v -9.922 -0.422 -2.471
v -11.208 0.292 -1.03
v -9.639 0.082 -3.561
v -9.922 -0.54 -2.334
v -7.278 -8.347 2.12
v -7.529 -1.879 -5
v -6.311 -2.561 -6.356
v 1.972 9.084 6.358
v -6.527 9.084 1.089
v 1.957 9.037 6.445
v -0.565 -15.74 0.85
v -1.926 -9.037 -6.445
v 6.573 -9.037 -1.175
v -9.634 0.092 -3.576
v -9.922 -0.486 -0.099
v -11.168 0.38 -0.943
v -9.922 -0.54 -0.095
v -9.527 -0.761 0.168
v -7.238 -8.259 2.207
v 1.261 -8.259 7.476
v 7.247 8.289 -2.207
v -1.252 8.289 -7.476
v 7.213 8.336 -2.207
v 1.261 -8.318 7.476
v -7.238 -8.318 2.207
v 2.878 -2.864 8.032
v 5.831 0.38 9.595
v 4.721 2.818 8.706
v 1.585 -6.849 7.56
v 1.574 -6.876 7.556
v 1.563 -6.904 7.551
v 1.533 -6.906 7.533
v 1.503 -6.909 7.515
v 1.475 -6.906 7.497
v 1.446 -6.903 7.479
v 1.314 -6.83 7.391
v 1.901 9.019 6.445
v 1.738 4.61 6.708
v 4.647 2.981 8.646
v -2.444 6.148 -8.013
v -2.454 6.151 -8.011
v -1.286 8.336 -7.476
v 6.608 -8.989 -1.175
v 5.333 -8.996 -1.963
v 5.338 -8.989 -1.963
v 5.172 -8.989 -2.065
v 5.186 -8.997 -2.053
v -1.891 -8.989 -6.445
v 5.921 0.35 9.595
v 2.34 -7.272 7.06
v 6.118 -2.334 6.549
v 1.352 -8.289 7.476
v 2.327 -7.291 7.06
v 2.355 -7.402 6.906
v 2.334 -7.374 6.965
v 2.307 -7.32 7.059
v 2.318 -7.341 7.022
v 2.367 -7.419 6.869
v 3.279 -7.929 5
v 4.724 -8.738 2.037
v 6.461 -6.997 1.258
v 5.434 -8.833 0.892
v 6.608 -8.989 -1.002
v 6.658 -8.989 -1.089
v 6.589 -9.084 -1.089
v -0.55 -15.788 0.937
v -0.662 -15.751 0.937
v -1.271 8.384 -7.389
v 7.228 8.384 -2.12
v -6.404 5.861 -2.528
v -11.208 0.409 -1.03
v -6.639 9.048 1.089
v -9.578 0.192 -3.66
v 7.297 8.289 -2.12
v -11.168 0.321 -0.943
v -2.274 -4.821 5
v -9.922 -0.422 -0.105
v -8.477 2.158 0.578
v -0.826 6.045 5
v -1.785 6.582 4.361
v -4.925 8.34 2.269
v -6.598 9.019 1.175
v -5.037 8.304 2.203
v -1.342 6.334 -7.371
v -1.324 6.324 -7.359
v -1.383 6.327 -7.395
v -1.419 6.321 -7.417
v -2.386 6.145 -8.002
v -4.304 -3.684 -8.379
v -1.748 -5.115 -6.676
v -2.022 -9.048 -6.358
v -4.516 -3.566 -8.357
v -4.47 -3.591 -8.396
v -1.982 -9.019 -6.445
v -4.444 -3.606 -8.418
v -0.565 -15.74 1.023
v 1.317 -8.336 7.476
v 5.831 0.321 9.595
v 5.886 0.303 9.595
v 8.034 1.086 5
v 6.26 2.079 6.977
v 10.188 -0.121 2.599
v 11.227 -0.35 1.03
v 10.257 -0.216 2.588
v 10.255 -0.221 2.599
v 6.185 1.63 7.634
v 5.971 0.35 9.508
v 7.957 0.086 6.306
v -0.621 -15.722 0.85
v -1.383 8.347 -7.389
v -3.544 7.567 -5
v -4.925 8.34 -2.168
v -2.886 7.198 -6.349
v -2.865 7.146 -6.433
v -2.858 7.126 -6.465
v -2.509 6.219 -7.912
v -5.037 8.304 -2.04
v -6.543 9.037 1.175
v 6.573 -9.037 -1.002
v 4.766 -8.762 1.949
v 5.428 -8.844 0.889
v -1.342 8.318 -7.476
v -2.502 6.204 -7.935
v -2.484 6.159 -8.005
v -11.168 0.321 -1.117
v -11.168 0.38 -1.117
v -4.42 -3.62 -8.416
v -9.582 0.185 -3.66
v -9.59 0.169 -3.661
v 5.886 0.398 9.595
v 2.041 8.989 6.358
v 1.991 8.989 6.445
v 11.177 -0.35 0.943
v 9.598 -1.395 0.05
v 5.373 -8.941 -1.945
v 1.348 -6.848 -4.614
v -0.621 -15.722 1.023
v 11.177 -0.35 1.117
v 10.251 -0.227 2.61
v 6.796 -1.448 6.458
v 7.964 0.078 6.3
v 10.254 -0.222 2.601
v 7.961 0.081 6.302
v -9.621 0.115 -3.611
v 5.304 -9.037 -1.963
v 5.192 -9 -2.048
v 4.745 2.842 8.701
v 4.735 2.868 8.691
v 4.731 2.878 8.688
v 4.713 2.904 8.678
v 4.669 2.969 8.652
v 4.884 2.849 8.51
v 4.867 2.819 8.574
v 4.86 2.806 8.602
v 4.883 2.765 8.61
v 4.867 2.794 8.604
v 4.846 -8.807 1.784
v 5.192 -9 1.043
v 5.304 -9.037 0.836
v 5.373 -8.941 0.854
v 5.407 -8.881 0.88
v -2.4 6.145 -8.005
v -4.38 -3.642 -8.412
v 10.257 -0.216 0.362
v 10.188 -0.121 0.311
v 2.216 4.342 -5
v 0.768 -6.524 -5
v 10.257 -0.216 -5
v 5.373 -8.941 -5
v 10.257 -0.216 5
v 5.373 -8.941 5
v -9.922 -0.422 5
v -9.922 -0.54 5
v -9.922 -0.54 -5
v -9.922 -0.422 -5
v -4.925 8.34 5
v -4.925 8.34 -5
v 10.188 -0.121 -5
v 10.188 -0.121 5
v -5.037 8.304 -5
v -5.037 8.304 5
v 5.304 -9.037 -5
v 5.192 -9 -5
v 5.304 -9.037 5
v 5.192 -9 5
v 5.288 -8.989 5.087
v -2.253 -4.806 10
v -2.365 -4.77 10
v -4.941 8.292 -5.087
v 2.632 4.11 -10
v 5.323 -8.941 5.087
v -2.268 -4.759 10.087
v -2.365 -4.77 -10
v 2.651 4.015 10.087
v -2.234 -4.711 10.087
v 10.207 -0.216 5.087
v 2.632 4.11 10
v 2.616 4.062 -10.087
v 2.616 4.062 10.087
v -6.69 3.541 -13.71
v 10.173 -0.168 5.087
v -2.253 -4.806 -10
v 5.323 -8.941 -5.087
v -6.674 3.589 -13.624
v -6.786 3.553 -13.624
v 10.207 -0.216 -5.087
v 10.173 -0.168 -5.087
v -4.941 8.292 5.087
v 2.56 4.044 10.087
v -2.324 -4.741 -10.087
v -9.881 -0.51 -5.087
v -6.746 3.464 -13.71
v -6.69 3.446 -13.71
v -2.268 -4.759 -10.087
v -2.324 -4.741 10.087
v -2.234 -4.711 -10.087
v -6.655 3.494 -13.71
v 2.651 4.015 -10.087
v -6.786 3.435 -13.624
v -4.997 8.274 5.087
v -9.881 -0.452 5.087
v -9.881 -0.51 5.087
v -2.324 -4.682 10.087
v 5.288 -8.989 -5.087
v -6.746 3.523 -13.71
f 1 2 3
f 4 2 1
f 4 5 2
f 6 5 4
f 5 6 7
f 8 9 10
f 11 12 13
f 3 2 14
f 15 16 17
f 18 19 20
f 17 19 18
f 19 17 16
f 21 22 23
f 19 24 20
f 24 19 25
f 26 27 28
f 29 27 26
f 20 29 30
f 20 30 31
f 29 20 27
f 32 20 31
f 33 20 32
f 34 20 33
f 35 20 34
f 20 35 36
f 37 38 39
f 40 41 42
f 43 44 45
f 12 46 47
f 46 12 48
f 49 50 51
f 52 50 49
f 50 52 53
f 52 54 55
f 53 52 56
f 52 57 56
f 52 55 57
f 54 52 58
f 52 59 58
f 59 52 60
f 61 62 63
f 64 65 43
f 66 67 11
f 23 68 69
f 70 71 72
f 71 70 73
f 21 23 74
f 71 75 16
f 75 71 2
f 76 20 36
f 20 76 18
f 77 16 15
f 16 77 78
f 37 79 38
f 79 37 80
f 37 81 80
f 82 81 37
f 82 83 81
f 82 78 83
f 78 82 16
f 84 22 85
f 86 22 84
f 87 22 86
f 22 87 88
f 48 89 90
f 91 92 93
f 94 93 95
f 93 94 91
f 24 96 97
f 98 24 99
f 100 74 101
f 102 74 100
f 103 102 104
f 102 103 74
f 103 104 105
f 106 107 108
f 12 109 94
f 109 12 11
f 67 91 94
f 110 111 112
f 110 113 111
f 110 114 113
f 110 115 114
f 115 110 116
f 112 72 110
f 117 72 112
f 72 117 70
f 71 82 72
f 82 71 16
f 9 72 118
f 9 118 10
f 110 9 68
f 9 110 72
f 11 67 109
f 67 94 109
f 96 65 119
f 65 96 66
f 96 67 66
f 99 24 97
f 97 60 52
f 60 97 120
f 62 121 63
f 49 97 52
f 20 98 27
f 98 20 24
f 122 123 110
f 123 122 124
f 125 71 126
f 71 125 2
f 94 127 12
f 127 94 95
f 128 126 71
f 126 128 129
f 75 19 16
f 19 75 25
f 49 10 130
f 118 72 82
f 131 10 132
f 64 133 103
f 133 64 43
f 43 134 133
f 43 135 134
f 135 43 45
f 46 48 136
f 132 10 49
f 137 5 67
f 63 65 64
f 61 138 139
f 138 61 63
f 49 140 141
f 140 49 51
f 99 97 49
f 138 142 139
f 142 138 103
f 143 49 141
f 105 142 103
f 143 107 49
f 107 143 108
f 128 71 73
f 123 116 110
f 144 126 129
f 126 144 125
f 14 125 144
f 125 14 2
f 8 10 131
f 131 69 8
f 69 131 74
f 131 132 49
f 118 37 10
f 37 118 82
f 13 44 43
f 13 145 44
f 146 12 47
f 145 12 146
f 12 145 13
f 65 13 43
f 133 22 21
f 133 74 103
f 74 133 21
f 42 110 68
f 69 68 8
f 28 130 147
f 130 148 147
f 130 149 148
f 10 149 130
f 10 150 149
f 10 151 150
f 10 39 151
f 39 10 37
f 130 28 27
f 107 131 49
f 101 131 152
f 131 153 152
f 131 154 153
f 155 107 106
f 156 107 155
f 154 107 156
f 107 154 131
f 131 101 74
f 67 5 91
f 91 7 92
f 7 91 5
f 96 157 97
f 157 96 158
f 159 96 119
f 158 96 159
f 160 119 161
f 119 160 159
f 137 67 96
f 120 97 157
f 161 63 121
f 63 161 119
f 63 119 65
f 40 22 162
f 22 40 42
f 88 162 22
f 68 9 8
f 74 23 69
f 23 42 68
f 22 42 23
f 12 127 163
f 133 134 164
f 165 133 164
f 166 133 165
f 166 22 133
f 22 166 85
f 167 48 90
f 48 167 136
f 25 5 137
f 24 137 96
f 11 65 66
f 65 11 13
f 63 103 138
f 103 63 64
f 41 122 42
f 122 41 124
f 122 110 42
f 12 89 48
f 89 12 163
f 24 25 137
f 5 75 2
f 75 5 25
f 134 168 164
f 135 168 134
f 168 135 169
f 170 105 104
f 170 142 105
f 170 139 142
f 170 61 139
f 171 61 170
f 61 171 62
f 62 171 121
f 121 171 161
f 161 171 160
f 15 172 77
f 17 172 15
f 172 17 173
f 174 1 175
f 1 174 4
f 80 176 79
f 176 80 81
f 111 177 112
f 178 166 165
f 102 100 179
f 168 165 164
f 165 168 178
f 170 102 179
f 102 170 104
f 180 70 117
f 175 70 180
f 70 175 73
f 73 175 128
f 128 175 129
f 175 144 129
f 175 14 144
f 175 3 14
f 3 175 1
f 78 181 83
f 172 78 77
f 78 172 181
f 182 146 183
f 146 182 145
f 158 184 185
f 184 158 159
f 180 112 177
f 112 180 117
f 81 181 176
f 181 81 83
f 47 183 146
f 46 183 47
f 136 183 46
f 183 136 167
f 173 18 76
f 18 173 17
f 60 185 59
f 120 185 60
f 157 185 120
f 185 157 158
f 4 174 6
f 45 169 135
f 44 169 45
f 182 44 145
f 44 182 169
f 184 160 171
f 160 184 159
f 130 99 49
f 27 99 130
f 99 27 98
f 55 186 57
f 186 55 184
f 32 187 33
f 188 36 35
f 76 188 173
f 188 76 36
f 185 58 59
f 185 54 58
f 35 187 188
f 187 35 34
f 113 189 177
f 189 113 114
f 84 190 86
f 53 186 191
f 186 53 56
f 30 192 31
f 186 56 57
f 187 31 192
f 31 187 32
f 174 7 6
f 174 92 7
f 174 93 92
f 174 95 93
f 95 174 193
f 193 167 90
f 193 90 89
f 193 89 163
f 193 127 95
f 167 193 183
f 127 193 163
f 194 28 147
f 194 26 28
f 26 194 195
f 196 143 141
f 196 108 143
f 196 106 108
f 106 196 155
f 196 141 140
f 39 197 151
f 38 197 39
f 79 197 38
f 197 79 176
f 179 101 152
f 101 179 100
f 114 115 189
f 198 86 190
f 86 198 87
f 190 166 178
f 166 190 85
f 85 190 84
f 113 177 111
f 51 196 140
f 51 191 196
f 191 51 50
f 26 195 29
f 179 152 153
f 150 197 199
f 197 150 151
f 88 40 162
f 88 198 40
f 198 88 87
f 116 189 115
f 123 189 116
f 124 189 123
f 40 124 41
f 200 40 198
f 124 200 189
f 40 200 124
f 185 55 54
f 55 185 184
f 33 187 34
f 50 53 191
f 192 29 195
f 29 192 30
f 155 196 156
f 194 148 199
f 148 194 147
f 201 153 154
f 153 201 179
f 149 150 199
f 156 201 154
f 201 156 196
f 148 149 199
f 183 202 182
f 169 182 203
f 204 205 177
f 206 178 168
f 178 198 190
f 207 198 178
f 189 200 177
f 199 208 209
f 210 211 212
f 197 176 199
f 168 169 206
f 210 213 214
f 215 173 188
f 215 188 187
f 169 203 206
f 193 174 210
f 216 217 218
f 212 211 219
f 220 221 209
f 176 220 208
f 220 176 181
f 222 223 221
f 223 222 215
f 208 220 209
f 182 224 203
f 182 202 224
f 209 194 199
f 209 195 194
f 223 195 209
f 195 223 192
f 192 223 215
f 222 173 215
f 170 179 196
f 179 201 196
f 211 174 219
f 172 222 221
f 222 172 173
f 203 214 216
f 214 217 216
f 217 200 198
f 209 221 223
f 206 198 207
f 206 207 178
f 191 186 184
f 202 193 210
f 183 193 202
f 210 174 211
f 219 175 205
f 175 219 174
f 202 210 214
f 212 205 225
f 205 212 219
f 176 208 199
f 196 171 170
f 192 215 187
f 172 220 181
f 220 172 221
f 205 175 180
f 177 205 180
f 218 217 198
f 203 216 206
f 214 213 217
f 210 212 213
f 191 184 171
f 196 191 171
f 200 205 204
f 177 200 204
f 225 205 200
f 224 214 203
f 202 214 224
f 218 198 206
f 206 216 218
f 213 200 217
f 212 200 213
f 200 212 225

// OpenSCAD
// Auto-generated OpenSCAD file

    inner_points = 10*[[0.5272841921394986, -0.8941494324725834, -0.5000000000002047], [1.0157495787801158, -0.02156616077066012, -0.5000000000002183], [-0.9840743682826907, -0.048102565072366016, 0.5000000000002183], [-0.49560898164207345, 0.8244807066295572, 0.5000000000002047], [-0.22839508807181572, -0.47112599877236716, -0.9999999999999931], [0.5272841921397184, -0.8941494324726909, 0.4999999999997952], [0.2600702985688014, 0.401457272929556, -1.0000000000000067], [1.0157495787803354, -0.021566160770767534, 0.49999999999978156], [-0.9840743682829104, -0.0481025650722586, -0.49999999999978156], [-0.22839508807137623, -0.4711259987725822, 1.0000000000000067], [-0.4956089816422933, 0.8244807066296647, -0.4999999999997952], [0.26007029856924085, 0.4014572729293411, 0.9999999999999931], [-0.6705068091423759, 0.3493759475629592, -1.3623724356956024]];

    outer_points = 10*[[-0.5871016774818598, -0.035032029076049194, -0.9508335170979203], [-1.1127273597817333, 0.035032029076049194, -0.10300766831643143], [1.1127273597817333, -0.035032029076049194, 0.10300766831643143], [0.5871016774818598, 0.035032029076049194, 0.9508335170979203], [-0.1941165129402417, -0.8989291704166398, -0.6358027414048893], [-0.1301723233916815, 0.8288651122645414, -0.7389437000837753], [-0.7197421952401151, -0.8288651122645414, 0.21202310737659946], [-0.6557980056915549, 0.8989291704166398, 0.10888214869771351], [0.6557980056915549, -0.8989291704166398, -0.10888214869771351], [0.7197421952401151, 0.8288651122645414, -0.21202310737659946], [0.1301723233916815, -0.8288651122645414, 0.7389437000837753], [0.1941165129402417, 0.8989291704166398, 0.6358027414048893], [-0.05807720084257707, -1.5692662035184195, 0.09367759939690216]];

    // Convex hull for inner set (I)
    module inner_hull() {
        hull() {
            for (p = inner_points) {
                translate(p) sphere(r=0.1);
            }
        }
    }

    // Convex hull for outer set (O) minus inner hull (O \ I)
    module outer_minus_inner() {
        difference() {
            hull() {
                for (p = outer_points) {
                    translate(p) sphere(r=0.1);
                }
            }
            inner_hull(); // Subtract inner hull
        }
    }

    // Convex hull for outer set (O) minus all translated inner hulls
    module outer_minus_AllTranslationInner() {
        difference() {
            hull() {
                for (p = outer_points) {
                    translate(p) sphere(r=0.1);
                }
            }
            hull() {
                translate([0,0,50]) inner_hull();
                translate([0,0,-50]) inner_hull();
            }; // Subtract translated inner hulls
        }
    }

    // Difference between outer_minus_inner and outer_minus_AllTranslationInner
    module outer_minus_inner_diff() {
        difference() {
            // Outer minus inner
            difference() {
                hull() {
                    for (p = outer_points) {
                        translate(p) sphere(r=0.1);
                    }
                }
                inner_hull();
            }

            // Subtract Outer minus AllTranslationInner
            difference() {
                hull() {
                    for (p = outer_points) {
                        translate(p) sphere(r=0.1);
                    }
                }
                hull() {
                    translate([0,0,50]) inner_hull();
                    translate([0,0,-50]) inner_hull();
                };
            }
        }
    }

    // Rendering all with colors applied
    color([1, 0, 0, 0.5]) inner_hull(); // Transparent red
    color([0, 1, 0, 1]) outer_minus_AllTranslationInner(); // Opaque green
    color([1, 1, 0, 1]) outer_minus_inner_diff(); // Opaque yellow
    
